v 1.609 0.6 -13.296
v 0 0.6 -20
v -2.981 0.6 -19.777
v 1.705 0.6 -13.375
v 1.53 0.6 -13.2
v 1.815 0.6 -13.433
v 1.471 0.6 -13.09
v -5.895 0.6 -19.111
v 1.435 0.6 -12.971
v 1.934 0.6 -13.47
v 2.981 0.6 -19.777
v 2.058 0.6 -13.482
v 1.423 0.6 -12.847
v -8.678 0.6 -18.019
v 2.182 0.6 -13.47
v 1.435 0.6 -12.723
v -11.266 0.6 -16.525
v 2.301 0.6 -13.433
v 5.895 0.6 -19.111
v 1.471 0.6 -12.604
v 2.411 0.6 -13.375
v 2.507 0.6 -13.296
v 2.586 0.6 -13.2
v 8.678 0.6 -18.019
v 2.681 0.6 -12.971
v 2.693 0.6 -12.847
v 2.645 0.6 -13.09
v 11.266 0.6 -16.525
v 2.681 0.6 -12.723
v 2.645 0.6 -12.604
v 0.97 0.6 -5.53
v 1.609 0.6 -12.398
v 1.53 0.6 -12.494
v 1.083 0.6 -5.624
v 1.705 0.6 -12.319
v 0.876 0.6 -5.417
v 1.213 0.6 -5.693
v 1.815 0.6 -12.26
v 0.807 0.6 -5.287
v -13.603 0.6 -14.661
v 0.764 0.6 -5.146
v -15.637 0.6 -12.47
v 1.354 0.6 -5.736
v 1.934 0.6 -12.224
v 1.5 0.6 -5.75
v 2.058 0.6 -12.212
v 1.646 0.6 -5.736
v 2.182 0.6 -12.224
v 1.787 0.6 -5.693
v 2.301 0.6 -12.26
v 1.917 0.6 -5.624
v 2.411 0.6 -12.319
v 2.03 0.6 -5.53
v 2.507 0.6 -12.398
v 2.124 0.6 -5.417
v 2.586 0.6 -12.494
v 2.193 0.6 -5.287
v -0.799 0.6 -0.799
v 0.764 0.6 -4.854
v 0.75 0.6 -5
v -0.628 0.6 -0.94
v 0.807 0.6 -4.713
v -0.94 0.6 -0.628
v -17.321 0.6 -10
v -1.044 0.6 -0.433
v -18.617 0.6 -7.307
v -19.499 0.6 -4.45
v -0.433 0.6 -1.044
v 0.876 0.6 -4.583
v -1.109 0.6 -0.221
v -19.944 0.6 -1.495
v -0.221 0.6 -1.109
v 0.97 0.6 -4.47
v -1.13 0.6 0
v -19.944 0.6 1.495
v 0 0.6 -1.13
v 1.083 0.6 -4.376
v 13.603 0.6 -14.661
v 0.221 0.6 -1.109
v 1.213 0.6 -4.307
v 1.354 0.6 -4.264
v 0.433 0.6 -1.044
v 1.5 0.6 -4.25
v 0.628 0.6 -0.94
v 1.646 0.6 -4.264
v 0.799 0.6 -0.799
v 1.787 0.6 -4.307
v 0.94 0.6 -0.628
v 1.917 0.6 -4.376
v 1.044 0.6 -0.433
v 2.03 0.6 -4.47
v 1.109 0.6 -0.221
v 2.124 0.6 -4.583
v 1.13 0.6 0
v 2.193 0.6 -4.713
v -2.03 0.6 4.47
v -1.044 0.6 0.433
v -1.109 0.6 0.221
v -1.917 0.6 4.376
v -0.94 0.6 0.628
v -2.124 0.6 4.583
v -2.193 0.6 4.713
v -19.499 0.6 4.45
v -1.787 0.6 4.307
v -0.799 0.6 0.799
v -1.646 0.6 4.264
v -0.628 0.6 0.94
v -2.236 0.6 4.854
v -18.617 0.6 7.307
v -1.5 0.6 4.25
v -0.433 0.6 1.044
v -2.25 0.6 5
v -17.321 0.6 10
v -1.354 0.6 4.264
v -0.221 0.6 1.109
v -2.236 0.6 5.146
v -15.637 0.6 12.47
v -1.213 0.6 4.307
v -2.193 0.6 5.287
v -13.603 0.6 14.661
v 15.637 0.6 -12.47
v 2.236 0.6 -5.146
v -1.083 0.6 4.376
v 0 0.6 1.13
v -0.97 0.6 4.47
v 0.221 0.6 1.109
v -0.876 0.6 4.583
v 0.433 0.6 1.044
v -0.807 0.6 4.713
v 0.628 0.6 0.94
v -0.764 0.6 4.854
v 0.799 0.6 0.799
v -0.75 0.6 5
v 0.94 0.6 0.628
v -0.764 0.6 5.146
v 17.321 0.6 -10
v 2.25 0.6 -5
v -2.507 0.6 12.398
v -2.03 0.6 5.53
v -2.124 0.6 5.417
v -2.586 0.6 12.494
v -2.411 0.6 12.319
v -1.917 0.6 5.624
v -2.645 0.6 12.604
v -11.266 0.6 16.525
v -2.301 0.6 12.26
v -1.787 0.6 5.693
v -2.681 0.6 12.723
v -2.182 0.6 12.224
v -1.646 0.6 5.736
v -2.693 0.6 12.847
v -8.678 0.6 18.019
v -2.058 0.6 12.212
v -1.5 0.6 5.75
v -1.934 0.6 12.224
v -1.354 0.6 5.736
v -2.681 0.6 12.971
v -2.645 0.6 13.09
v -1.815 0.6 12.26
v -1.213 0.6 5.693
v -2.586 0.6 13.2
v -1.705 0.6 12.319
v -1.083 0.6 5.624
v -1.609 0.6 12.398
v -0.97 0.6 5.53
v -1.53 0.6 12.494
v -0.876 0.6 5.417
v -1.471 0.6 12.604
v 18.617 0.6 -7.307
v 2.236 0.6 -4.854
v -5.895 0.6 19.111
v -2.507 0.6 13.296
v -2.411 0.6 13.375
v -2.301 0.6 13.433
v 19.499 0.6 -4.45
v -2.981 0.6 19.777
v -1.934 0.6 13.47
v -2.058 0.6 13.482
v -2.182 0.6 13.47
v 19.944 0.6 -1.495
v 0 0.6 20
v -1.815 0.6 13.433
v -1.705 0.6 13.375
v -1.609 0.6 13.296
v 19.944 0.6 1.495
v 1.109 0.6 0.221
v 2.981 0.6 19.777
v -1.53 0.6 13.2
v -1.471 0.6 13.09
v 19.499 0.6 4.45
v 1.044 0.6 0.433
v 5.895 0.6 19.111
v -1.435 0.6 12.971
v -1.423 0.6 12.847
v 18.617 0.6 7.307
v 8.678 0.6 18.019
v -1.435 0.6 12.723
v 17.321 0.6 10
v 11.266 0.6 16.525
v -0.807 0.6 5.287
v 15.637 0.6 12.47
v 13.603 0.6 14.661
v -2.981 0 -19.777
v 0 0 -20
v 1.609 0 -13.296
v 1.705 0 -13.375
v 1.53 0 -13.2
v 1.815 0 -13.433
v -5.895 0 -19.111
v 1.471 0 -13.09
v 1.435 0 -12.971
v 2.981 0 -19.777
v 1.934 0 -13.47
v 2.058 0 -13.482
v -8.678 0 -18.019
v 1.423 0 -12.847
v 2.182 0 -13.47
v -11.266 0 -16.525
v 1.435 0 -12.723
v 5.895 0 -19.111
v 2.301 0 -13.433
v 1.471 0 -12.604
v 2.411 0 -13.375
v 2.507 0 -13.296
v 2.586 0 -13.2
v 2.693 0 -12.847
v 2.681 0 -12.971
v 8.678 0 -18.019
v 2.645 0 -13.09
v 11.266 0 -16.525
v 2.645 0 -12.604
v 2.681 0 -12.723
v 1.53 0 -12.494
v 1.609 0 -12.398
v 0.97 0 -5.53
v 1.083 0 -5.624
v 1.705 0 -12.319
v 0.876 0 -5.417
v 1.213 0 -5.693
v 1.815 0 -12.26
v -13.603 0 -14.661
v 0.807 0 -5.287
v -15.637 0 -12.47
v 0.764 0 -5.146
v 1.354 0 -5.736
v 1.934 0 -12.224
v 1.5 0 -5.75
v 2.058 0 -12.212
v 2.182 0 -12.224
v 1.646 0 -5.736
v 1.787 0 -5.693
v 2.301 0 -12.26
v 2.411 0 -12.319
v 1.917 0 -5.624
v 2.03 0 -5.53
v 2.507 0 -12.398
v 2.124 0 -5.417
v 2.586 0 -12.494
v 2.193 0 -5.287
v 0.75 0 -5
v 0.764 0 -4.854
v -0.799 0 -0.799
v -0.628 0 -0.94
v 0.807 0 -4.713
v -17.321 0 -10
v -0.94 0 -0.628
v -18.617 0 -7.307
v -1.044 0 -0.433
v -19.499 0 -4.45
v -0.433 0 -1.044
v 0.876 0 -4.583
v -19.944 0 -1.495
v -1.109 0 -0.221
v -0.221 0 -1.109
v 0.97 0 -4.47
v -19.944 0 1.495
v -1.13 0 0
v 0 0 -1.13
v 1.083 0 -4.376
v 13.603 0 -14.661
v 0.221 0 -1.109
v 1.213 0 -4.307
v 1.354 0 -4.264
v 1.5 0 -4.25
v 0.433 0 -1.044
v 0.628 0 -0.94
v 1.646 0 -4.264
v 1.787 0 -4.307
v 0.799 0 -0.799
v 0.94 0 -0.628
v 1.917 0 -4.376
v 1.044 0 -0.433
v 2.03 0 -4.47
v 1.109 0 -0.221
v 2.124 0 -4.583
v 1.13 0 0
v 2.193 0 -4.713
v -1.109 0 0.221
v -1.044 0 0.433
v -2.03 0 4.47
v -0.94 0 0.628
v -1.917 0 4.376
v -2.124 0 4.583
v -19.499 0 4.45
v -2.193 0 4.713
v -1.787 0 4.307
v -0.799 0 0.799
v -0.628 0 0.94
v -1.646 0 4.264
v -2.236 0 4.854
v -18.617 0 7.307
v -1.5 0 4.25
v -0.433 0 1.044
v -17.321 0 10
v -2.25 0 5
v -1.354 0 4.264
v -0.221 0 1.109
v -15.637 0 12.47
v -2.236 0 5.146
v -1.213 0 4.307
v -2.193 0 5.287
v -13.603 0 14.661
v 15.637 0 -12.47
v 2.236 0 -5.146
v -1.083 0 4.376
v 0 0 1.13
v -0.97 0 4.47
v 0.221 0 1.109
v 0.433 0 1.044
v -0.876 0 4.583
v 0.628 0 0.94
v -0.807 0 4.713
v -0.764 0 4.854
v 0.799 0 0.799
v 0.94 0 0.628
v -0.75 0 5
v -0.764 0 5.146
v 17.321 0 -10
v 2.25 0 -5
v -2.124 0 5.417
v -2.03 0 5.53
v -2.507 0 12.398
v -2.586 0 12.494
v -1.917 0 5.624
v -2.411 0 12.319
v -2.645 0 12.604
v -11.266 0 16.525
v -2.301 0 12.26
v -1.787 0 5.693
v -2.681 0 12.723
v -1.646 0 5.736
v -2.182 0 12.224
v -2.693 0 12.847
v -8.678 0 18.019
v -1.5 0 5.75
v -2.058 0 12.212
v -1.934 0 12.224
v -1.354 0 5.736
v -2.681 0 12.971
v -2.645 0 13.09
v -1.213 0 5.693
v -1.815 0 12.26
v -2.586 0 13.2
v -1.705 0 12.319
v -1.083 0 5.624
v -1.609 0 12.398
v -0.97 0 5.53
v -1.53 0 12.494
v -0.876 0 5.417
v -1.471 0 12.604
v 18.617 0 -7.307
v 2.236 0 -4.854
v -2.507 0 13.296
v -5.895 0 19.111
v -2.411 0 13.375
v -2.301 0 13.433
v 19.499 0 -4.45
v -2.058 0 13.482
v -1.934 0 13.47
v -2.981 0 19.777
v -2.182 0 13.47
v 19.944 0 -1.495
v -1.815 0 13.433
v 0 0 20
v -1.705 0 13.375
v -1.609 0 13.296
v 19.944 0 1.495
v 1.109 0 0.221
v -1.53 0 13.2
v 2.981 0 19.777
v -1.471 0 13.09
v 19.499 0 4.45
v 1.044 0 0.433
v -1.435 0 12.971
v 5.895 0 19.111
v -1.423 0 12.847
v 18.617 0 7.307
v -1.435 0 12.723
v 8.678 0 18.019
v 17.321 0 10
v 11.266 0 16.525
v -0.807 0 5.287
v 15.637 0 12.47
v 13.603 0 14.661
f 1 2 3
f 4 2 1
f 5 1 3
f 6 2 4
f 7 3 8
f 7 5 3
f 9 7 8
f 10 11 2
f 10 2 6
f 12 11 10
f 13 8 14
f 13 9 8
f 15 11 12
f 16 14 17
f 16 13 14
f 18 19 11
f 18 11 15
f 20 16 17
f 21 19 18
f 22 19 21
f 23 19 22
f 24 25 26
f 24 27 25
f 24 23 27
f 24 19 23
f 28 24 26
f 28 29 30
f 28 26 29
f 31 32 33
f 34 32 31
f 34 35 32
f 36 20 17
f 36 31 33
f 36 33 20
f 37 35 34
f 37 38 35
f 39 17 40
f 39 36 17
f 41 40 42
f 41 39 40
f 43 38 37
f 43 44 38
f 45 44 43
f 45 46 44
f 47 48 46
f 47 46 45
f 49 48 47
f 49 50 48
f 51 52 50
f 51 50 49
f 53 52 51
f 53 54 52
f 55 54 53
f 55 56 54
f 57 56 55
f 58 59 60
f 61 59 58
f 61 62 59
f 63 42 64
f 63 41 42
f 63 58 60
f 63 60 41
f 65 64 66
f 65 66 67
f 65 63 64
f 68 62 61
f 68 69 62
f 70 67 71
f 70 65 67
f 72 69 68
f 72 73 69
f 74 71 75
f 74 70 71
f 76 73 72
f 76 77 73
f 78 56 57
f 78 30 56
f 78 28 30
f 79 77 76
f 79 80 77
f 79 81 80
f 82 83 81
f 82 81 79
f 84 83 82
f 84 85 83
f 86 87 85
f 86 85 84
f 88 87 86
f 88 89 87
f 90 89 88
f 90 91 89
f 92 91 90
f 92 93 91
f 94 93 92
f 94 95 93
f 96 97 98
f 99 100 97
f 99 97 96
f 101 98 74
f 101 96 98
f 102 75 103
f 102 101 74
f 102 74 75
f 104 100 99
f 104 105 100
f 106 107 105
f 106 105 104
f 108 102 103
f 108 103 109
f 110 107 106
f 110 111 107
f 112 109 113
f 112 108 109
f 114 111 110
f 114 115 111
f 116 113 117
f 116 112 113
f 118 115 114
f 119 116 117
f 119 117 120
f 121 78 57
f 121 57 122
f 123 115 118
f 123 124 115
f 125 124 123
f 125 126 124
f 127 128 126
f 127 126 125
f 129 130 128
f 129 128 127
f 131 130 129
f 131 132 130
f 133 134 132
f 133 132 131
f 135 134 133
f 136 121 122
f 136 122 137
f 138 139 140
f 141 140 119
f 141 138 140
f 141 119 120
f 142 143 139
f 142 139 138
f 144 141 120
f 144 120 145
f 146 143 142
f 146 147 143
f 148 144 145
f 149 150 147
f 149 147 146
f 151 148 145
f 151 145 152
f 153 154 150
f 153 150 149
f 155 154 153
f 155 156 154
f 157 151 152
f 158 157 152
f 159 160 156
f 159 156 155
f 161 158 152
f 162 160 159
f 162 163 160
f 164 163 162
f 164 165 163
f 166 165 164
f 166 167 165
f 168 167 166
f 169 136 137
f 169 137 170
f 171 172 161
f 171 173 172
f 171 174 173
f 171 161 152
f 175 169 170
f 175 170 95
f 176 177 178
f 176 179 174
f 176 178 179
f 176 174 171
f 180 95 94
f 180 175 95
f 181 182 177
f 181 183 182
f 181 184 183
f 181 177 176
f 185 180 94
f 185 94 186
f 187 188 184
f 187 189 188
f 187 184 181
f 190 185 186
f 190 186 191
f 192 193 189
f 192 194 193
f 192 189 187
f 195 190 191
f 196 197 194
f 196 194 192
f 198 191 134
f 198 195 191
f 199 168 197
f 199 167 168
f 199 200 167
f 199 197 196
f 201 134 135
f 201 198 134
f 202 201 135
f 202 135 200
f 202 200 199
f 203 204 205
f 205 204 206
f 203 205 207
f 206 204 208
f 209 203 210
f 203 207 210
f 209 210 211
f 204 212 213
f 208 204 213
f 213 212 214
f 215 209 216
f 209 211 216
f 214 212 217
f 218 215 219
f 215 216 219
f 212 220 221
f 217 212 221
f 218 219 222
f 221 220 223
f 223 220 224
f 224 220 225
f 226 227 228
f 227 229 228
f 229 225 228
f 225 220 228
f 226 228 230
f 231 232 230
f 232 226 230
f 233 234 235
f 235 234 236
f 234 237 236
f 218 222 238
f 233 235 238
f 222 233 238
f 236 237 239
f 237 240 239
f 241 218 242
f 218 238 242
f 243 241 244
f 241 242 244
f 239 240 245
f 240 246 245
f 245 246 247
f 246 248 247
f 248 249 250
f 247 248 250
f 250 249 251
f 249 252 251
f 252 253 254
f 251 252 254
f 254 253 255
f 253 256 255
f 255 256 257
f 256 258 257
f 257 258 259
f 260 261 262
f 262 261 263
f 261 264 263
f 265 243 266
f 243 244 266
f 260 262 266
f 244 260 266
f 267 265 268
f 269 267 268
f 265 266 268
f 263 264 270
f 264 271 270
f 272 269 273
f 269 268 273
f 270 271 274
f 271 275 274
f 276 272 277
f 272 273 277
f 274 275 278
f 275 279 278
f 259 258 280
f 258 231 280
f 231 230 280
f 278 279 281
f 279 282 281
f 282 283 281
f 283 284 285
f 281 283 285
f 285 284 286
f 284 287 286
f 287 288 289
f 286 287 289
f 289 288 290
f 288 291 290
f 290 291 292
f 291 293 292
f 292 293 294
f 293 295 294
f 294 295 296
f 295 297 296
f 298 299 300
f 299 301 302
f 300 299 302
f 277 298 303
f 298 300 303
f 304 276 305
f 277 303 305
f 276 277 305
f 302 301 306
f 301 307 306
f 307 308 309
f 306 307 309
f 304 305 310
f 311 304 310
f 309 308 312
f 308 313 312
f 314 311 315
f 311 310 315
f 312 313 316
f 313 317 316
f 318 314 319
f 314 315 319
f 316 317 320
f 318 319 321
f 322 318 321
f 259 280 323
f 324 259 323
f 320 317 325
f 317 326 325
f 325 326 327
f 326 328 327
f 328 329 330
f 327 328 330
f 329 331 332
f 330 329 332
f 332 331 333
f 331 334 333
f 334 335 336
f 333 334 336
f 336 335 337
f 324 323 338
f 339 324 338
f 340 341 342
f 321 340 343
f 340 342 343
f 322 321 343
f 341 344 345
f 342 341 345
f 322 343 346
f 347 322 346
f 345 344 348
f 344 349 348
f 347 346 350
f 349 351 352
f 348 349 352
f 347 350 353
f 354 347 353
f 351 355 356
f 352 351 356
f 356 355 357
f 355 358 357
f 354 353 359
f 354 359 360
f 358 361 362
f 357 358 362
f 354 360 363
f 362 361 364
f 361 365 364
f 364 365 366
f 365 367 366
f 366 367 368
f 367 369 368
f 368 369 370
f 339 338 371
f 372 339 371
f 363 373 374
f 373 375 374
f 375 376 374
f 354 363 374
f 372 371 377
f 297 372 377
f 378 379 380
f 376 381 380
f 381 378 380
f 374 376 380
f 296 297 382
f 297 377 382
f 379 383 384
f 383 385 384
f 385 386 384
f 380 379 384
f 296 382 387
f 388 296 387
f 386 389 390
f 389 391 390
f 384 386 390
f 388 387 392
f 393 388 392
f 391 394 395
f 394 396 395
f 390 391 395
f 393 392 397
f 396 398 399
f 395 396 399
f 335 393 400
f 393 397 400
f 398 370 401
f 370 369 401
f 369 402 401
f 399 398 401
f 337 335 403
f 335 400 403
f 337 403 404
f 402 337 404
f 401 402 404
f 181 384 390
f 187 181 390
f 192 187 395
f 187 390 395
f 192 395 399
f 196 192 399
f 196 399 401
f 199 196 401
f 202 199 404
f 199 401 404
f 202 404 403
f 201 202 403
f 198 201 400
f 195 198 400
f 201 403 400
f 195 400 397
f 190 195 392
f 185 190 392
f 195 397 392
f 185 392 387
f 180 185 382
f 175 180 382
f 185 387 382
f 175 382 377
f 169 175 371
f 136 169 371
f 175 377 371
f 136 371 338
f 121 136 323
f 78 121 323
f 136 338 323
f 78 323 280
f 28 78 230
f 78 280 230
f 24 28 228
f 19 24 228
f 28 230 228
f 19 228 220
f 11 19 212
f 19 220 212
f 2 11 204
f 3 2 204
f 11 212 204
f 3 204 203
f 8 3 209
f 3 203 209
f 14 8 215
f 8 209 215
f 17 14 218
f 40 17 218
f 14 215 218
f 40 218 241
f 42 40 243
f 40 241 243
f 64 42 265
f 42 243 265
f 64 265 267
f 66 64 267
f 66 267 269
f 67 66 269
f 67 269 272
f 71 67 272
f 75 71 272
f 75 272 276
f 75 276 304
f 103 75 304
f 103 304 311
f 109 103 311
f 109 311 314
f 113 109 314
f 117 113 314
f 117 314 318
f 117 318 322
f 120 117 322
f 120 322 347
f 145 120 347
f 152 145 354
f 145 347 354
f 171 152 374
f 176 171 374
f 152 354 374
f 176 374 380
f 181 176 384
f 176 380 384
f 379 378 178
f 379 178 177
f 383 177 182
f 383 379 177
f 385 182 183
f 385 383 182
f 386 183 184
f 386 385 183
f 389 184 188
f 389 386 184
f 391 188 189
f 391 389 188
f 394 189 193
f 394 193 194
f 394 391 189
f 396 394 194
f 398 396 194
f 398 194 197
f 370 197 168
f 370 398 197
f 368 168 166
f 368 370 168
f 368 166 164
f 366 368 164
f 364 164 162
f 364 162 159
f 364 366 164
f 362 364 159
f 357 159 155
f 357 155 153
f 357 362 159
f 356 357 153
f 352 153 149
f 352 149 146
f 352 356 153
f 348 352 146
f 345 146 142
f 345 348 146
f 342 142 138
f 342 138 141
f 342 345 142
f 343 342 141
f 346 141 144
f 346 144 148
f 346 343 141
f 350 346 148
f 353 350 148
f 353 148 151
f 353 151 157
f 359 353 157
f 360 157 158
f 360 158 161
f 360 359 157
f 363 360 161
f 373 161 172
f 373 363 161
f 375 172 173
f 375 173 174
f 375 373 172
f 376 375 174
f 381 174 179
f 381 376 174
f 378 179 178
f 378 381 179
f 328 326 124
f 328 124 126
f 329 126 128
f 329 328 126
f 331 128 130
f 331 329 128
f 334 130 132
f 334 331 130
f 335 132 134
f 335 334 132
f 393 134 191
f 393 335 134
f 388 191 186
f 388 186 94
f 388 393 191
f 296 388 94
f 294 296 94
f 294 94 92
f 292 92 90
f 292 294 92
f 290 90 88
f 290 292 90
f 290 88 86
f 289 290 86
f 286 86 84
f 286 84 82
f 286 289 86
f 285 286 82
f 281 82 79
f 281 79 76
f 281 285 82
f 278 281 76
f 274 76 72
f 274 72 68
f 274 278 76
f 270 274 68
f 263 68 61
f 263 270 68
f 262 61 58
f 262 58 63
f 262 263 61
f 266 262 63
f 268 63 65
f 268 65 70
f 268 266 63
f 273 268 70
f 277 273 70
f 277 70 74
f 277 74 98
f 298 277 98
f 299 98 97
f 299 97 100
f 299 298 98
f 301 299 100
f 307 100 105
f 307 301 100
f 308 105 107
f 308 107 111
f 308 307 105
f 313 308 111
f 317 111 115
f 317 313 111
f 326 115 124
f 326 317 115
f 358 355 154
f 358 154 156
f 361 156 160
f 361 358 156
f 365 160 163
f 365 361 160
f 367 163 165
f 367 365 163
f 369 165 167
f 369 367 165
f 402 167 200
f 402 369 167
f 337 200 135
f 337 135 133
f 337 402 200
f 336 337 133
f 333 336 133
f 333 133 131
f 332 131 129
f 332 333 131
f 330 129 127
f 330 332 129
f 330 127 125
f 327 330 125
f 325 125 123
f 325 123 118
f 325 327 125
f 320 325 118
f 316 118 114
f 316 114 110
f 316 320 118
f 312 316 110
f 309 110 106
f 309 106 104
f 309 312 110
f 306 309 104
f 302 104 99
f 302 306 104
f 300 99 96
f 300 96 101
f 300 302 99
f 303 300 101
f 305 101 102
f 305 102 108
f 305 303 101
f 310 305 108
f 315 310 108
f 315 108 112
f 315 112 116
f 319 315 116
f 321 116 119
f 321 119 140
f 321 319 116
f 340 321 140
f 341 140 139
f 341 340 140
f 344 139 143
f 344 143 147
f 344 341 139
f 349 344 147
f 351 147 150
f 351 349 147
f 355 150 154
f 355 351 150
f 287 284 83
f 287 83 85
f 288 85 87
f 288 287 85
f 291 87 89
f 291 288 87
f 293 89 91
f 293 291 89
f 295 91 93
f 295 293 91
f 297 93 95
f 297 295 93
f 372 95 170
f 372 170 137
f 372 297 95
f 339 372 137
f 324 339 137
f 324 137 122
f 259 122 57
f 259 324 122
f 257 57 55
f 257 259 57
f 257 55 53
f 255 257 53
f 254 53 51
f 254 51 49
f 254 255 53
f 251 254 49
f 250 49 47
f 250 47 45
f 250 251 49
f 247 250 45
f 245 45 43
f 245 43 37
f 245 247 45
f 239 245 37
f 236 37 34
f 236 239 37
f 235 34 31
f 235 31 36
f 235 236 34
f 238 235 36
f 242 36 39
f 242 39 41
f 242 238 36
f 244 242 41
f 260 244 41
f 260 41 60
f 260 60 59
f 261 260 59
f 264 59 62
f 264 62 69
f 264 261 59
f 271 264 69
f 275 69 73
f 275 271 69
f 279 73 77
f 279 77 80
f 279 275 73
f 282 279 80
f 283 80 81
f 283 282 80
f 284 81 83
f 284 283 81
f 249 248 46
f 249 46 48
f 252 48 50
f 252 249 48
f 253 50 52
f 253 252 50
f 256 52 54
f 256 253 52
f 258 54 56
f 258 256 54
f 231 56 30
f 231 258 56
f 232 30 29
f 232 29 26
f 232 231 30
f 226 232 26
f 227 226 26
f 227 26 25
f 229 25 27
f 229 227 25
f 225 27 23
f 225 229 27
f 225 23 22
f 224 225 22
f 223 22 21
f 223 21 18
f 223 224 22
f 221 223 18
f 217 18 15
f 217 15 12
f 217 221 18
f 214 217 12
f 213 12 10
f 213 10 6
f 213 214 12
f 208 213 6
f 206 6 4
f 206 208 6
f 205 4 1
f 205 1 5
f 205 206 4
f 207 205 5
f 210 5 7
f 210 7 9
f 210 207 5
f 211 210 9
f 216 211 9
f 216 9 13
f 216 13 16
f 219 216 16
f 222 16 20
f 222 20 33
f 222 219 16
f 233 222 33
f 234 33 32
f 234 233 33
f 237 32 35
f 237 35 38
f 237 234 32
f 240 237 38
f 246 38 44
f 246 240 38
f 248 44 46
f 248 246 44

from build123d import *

# Parameters (mm, degrees)
SKETCH1_R   = 20
SKETCH1_R_2 = 1.1303
SKETCH1_R_3 = 0.75
SKETCH1_R_4 = 0.635
PCB_DEPTH   = 0.6


with BuildPart() as part:
    # Sketch1 → PCB (new body)
    with BuildSketch(Plane(origin=(0, 0, 0), x_dir=(1, 0, 0), z_dir=(0, 1, 0))):
        with Locations(Location((0, 0, 0), (0, 0, 270))):
            Circle(SKETCH1_R)
        with Locations(Location((0, 0, 0), (0, 0, 270))):
            Circle(SKETCH1_R_2, mode=Mode.SUBTRACT)
        with Locations(Location((1.5, 5, 0), (0, 0, 270))):
            Circle(SKETCH1_R_3, mode=Mode.SUBTRACT)
        with Locations(Location((-1.5, -5, 0), (0, 0, 270))):
            Circle(SKETCH1_R_3, mode=Mode.SUBTRACT)
        with Locations(Location((2.05801875, 12.846715625, 0), (0, 0, 270))):
            Circle(SKETCH1_R_4, mode=Mode.SUBTRACT)
        with Locations(Location((-2.05801875, -12.846715625, 0), (0, 0, 270))):
            Circle(SKETCH1_R_4, mode=Mode.SUBTRACT)
    extrude(amount=PCB_DEPTH)


solid = part.part
